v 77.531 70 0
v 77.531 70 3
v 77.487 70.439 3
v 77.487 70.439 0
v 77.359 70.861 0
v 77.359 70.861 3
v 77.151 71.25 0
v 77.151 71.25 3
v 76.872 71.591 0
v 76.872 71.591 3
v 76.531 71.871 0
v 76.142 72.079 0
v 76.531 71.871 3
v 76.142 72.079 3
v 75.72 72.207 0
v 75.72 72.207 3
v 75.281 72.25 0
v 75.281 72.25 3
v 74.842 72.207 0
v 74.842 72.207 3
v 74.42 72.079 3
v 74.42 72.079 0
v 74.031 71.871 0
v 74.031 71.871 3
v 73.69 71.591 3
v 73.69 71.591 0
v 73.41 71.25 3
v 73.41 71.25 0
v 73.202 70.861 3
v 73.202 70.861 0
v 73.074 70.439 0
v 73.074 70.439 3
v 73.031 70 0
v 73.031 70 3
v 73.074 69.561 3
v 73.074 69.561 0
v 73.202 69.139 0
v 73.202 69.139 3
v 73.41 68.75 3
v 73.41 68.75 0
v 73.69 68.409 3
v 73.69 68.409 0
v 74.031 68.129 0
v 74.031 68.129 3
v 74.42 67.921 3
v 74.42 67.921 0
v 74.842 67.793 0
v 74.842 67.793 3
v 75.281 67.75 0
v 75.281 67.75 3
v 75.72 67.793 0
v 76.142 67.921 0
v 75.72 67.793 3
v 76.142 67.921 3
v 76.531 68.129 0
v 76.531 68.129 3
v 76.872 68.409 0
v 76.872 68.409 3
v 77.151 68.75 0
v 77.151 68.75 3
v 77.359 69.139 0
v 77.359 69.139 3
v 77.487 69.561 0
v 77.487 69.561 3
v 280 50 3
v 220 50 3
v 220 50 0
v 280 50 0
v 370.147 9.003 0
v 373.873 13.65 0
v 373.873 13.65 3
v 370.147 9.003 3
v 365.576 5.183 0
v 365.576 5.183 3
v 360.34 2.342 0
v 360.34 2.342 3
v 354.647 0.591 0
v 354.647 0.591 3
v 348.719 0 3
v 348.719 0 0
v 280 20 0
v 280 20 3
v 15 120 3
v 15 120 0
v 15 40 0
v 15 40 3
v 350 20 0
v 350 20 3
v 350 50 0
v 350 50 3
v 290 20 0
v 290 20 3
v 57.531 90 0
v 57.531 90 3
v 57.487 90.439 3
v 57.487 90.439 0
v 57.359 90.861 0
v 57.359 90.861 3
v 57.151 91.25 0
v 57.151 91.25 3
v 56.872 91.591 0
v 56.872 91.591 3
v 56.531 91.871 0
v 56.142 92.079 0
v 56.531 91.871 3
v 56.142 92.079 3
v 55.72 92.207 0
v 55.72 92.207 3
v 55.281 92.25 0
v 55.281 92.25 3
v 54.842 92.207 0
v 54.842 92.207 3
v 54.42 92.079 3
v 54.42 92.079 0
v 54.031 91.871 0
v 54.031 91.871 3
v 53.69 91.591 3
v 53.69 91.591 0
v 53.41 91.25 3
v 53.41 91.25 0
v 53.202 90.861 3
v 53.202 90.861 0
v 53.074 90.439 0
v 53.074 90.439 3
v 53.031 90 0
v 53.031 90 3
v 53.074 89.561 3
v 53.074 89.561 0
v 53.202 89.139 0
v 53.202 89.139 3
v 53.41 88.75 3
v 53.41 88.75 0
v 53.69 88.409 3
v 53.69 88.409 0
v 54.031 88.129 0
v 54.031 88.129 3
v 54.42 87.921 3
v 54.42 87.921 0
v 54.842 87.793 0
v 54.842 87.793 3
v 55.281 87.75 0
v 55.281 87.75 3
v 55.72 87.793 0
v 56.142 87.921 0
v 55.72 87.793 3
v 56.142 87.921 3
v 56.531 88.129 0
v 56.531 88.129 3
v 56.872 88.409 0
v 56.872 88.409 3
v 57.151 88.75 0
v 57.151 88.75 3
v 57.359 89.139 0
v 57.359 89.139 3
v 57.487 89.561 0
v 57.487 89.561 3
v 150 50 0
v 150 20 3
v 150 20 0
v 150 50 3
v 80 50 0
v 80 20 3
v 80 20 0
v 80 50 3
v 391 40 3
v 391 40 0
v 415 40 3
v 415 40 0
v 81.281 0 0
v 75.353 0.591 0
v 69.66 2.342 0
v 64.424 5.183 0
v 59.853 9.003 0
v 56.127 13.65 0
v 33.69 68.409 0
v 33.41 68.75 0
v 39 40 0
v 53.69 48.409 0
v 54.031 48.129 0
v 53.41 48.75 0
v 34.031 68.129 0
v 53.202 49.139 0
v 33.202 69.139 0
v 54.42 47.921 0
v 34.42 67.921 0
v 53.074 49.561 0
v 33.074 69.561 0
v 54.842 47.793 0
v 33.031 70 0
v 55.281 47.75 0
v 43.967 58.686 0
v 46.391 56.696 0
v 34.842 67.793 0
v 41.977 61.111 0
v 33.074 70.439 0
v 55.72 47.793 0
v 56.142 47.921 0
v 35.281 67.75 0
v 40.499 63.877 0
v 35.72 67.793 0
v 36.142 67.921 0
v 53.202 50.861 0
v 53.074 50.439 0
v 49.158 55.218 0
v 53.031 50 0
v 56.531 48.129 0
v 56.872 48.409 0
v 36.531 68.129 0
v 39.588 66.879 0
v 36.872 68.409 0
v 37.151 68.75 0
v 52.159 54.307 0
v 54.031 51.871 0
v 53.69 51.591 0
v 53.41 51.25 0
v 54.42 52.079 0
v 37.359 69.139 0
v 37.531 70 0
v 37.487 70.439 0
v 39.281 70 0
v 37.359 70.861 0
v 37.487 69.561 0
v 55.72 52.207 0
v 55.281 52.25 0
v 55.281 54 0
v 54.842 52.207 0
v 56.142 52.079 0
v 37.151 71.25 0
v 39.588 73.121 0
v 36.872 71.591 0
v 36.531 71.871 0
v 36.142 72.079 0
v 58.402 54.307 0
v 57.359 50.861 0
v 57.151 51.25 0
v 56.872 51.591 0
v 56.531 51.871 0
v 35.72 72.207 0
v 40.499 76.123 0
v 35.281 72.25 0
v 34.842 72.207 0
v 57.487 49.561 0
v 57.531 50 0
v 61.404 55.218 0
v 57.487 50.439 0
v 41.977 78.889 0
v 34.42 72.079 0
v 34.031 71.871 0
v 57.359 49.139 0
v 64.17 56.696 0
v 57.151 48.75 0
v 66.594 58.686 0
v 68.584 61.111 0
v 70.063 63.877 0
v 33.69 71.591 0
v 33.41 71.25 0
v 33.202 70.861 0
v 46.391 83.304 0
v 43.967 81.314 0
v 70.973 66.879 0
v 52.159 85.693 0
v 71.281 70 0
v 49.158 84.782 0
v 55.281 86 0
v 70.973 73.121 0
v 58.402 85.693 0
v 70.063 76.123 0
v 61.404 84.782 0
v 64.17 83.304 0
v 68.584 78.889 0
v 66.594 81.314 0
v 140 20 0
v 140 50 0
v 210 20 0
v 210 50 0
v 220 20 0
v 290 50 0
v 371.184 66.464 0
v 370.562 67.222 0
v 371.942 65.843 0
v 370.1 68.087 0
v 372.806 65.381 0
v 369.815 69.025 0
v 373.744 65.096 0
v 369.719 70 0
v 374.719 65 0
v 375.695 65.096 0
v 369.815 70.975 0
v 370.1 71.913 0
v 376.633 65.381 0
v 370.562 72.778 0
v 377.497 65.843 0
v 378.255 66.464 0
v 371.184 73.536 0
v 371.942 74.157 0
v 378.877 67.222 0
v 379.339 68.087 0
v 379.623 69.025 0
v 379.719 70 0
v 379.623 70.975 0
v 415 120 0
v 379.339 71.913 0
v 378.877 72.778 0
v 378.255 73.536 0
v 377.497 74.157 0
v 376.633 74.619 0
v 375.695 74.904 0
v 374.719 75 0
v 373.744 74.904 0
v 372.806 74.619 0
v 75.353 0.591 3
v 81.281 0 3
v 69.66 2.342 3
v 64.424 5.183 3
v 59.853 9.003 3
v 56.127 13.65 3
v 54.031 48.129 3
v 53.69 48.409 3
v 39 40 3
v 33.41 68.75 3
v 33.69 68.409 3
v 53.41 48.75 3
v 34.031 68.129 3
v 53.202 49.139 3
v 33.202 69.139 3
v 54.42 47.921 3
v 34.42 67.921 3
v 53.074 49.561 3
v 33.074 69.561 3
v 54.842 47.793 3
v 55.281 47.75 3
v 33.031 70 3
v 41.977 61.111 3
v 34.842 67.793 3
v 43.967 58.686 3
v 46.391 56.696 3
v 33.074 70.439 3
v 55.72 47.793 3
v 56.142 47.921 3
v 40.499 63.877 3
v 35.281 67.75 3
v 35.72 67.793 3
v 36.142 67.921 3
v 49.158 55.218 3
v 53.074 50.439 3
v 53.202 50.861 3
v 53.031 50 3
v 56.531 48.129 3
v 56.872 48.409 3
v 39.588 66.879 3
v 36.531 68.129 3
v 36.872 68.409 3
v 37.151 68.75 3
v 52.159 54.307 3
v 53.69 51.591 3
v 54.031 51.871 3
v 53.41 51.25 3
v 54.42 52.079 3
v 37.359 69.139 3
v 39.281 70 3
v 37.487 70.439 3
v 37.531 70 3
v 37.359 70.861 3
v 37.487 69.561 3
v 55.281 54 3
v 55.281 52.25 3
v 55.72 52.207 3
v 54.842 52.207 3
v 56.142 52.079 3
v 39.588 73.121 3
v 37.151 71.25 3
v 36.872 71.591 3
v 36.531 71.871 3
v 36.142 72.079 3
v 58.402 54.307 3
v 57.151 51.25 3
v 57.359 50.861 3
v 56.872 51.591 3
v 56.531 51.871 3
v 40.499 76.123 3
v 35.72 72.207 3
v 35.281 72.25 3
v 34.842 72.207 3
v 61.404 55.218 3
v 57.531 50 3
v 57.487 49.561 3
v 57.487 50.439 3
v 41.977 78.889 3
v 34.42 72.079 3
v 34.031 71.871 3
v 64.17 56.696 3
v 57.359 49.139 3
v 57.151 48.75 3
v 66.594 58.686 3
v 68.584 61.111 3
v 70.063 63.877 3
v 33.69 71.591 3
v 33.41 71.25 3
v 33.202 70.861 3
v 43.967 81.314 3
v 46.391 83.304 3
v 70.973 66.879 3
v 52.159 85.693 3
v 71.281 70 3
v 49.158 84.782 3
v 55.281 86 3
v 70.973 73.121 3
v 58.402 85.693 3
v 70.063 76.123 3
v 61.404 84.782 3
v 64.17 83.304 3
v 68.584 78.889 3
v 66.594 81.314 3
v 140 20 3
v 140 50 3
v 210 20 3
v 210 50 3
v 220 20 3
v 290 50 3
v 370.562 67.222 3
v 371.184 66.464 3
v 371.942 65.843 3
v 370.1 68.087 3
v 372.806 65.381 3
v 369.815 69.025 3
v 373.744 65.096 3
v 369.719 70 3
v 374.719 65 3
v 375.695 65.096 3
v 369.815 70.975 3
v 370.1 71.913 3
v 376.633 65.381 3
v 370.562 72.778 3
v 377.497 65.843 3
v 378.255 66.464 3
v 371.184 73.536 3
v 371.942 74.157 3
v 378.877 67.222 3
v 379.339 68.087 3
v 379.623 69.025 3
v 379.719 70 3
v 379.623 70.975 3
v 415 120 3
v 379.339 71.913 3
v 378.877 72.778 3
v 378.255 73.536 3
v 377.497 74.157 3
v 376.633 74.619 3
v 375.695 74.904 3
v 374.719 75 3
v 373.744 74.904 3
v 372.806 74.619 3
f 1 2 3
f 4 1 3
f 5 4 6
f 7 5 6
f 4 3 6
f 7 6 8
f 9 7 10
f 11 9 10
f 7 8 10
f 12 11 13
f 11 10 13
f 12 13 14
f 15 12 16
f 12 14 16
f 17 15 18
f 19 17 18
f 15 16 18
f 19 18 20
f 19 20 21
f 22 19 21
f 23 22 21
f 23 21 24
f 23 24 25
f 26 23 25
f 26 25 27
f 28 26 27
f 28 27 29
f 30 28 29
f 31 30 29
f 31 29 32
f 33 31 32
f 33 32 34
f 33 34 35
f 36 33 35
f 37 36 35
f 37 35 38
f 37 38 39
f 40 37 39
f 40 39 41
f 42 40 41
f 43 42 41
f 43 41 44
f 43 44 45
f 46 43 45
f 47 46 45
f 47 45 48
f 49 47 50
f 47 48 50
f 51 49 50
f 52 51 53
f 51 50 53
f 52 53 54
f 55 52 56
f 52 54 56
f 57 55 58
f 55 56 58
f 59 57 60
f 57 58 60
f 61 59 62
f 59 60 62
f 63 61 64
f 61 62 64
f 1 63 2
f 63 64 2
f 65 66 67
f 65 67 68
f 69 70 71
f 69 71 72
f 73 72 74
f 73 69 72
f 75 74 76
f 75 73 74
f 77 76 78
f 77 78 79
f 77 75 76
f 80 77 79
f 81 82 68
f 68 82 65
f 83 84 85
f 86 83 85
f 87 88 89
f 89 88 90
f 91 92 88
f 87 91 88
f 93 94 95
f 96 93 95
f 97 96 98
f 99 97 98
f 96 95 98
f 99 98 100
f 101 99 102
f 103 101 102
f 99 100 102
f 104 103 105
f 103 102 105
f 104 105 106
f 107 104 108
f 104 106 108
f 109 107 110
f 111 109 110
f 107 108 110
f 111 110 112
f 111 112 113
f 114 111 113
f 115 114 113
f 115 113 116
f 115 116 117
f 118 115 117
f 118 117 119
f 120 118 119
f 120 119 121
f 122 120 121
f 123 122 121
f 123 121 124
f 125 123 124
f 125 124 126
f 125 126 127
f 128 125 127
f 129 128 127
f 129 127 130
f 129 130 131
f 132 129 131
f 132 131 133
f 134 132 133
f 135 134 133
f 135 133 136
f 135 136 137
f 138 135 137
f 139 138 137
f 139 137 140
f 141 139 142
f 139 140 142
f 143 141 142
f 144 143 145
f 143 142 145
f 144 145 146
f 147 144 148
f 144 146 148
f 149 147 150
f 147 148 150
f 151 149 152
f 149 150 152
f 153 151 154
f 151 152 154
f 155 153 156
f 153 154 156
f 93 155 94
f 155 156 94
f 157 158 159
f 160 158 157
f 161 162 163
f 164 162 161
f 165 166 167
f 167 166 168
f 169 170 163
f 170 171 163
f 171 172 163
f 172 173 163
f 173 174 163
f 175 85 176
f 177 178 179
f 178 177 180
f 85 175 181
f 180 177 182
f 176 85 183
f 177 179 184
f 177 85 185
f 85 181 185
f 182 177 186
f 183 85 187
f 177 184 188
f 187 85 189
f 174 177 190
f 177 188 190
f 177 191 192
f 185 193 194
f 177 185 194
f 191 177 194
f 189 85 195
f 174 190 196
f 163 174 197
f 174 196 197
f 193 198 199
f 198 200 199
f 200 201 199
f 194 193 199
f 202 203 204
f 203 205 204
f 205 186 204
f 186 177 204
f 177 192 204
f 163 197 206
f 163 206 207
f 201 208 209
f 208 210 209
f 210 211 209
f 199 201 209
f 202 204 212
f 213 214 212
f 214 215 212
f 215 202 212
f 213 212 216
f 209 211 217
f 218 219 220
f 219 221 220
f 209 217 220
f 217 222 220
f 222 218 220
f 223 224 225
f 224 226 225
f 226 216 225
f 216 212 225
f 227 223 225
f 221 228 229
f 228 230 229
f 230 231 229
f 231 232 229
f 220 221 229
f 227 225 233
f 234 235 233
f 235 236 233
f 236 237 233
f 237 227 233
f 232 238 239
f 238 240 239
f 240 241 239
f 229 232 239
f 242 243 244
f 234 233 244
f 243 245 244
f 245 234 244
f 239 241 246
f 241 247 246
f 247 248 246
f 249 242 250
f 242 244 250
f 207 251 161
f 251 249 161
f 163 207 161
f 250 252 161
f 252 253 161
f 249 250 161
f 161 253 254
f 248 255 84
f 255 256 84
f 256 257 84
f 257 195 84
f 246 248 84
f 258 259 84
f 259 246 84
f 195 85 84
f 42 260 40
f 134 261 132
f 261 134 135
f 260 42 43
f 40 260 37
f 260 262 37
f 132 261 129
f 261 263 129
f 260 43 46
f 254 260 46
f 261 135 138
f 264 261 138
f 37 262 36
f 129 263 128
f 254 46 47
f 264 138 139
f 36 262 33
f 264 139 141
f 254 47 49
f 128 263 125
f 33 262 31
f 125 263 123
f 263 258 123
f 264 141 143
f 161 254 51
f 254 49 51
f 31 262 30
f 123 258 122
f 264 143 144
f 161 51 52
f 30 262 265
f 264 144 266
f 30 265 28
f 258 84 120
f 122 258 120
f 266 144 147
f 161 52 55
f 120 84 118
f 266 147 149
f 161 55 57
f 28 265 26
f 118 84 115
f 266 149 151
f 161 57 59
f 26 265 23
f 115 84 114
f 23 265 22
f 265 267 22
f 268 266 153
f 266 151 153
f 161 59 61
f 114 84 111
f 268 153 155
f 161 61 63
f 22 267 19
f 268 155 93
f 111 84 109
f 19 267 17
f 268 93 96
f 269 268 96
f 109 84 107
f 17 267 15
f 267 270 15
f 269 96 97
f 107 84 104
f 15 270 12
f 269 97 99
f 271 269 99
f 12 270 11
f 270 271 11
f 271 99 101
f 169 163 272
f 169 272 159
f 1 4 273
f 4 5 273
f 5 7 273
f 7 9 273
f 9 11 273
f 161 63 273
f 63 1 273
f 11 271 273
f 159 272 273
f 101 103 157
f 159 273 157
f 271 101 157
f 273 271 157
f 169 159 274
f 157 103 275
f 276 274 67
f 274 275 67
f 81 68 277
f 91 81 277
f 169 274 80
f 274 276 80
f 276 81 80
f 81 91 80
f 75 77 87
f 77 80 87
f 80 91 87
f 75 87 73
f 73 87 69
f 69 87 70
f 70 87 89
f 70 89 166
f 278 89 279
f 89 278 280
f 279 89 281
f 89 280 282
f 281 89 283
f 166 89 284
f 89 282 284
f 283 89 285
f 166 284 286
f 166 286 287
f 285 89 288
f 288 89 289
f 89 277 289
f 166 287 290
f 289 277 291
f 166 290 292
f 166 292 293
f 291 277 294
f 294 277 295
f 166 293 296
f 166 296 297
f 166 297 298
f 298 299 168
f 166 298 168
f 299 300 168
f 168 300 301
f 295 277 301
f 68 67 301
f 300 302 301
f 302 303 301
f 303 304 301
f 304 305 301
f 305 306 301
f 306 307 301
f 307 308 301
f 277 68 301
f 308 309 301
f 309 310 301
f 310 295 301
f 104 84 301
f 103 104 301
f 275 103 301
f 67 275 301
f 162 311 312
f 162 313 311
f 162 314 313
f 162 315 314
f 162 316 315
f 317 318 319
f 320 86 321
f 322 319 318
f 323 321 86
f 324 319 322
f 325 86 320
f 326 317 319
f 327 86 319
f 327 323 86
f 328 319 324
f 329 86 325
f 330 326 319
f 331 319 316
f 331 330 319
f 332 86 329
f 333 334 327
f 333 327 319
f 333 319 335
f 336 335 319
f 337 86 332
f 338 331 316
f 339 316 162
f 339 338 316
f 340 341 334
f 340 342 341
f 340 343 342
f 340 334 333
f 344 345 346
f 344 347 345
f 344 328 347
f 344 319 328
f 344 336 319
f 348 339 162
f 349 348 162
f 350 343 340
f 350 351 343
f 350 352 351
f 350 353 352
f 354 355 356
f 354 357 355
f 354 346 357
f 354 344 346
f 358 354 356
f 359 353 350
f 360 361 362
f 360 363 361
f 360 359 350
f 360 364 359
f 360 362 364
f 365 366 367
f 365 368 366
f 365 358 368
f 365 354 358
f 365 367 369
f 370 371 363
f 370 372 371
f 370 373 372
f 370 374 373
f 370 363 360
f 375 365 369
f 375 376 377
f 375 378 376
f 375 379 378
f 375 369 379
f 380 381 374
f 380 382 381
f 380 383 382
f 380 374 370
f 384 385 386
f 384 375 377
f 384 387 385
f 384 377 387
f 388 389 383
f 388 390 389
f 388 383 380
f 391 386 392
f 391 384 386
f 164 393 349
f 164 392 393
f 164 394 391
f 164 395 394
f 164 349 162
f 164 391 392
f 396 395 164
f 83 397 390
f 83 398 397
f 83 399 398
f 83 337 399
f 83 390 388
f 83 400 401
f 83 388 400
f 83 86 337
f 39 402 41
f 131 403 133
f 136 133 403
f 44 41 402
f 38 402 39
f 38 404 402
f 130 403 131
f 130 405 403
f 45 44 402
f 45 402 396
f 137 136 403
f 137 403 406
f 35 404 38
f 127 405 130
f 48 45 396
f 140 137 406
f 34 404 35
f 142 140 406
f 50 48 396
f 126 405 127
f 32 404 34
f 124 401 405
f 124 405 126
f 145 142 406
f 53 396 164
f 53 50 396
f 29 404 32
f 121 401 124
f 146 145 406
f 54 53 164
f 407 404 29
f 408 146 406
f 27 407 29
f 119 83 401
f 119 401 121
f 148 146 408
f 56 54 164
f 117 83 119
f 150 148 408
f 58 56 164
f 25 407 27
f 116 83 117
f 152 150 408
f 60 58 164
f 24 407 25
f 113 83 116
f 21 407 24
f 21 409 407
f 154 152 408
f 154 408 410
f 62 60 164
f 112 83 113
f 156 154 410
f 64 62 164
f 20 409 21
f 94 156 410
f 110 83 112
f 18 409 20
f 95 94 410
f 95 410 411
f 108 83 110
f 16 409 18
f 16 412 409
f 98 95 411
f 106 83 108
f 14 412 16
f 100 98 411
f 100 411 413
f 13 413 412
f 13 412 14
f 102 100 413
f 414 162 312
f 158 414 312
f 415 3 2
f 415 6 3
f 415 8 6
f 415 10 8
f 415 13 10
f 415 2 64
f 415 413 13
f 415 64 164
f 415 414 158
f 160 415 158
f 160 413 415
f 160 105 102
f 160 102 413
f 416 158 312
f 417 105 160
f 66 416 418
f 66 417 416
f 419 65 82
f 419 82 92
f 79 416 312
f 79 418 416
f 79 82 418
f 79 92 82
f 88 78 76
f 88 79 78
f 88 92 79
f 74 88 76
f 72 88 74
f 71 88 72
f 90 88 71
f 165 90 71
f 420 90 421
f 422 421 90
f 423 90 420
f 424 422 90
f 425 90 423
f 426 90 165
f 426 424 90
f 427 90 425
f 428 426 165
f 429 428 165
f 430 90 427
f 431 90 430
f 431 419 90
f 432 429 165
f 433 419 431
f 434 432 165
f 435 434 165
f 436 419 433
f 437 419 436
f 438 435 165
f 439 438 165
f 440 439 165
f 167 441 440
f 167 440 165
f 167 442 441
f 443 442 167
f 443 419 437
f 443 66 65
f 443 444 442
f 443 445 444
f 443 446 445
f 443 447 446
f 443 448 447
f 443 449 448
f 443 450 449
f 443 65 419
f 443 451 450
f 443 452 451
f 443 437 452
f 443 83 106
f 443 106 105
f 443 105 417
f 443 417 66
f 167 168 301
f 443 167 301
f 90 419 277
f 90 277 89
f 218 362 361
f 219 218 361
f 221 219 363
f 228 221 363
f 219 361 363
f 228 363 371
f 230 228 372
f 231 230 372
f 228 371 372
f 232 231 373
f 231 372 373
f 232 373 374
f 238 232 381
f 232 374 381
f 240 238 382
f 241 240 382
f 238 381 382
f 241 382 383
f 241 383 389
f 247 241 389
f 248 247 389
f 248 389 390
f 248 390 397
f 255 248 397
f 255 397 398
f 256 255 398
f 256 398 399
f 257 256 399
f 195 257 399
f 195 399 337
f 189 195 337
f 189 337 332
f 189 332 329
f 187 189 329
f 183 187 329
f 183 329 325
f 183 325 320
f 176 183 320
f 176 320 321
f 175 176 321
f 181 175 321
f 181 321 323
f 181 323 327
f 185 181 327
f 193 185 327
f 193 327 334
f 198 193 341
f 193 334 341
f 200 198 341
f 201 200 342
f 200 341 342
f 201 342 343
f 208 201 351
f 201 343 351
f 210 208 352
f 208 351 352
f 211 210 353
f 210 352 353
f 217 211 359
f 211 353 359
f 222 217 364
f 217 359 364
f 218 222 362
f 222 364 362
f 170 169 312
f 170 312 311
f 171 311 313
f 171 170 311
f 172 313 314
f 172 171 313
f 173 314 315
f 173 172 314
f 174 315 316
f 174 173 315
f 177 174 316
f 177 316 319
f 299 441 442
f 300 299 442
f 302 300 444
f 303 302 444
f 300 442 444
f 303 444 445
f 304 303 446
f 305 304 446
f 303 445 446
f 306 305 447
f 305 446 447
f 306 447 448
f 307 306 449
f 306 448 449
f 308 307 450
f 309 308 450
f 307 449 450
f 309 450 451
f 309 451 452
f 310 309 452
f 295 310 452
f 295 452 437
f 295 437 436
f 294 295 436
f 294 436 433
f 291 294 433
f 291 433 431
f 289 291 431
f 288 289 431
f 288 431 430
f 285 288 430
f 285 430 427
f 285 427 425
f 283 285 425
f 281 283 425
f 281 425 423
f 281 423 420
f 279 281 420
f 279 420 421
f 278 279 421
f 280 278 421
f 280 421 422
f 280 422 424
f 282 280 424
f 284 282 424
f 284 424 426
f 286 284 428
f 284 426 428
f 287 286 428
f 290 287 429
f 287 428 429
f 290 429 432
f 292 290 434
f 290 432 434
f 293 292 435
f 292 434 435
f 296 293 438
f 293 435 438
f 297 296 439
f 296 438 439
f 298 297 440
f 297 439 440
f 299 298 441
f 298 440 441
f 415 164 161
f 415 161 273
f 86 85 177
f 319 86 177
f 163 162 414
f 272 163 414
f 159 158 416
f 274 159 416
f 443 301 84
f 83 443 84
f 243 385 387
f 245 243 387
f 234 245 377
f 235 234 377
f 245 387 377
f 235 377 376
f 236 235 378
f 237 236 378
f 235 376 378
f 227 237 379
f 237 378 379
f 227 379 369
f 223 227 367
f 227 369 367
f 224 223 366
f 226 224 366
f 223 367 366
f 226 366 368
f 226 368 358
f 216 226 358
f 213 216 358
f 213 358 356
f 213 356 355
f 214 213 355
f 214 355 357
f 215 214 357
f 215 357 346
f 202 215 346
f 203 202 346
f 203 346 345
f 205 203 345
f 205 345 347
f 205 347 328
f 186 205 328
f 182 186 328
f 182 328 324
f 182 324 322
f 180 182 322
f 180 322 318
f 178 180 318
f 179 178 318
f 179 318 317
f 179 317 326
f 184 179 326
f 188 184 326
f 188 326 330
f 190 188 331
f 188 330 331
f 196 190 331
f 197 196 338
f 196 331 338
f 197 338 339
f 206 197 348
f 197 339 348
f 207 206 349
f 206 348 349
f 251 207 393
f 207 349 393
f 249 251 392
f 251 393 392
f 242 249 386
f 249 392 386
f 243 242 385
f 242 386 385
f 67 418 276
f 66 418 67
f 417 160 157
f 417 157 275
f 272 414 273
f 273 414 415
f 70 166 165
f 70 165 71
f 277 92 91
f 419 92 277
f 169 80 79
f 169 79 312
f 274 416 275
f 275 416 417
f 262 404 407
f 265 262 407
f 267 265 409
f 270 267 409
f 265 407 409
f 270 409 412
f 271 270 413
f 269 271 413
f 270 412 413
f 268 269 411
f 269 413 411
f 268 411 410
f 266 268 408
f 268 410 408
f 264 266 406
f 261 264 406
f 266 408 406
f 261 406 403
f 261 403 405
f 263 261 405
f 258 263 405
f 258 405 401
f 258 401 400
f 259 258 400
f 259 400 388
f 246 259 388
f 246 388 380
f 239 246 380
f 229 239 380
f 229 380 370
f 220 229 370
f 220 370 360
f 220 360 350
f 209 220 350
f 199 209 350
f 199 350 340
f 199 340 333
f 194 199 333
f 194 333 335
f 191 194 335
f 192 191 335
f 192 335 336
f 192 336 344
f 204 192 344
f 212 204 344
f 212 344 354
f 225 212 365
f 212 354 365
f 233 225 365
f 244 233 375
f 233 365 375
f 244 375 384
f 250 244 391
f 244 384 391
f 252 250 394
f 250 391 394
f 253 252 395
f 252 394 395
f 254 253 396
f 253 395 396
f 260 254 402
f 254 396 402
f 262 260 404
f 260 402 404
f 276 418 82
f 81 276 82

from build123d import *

# Parameters (mm, degrees)
EXTRUDE_1_DEPTH     = 3
SKETCH_2_W          = 60
SKETCH_2_H          = 30
CUT_EXTRUDE_2_DEPTH = 417.901436616
SKETCH_3_R          = 16
SKETCH_3_R_2        = 2.25
SKETCH_3_R_3        = 5
CUT_EXTRUDE_3_DEPTH = 417.901436616
EXTRUDE_START       = -3
EXTRUDE_4_DEPTH     = 3


with BuildPart() as part:
    # 草圖1 → 伸長1 (new body)
    with BuildSketch(Plane.XY):
        with BuildLine():
            Line((55.280581326, 100), (374.719418674, 100))
            ThreePointArc((374.719418674, 100), (401.086913014, 84.309271198), (399.872727163, 53.650349482))
            Line((399.872727163, 53.650349482), (373.872727163, 13.650349482))
            ThreePointArc((373.872727163, 13.650349482), (363.028689873, 3.63250566), (348.719418674, 0))
            Line((348.719418674, 0), (81.280581326, 0))
            ThreePointArc((81.280581326, 0), (66.971310127, 3.63250566), (56.127272837, 13.650349482))
            Line((56.127272837, 13.650349482), (30.127272837, 53.650349482))
            ThreePointArc((30.127272837, 53.650349482), (28.913086986, 84.309271198), (55.280581326, 100))
        make_face()
    extrude(amount=EXTRUDE_1_DEPTH)

    # 草圖2 → 伸長2 (cut, through all)
    with BuildSketch(Plane.XY.offset(3)):
        with Locations((110, 35)):
            Rectangle(SKETCH_2_W, SKETCH_2_H)
        with Locations((180, 35)):
            Rectangle(SKETCH_2_W, SKETCH_2_H)
        with Locations((250, 35)):
            Rectangle(SKETCH_2_W, SKETCH_2_H)
        with Locations((320, 35)):
            Rectangle(SKETCH_2_W, SKETCH_2_H)
    extrude(amount=-CUT_EXTRUDE_2_DEPTH, mode=Mode.SUBTRACT)

    # 草圖3 → 伸長3 (cut, through all)
    with BuildSketch(Plane.XY.offset(3)):
        with Locations((55.280581326, 70)):
            Circle(SKETCH_3_R)
        with Locations((55.280581326, 90)):
            Circle(SKETCH_3_R_2)
        with Locations((75.280581326, 70)):
            Circle(SKETCH_3_R_2)
        with Locations((55.280581326, 50)):
            Circle(SKETCH_3_R_2)
        with Locations((35.280581326, 70)):
            Circle(SKETCH_3_R_2)
        with Locations((374.719418674, 70)):
            Circle(SKETCH_3_R_3)
    extrude(amount=-CUT_EXTRUDE_3_DEPTH, mode=Mode.SUBTRACT)

    # 草圖4 → 伸長4 (add)
    with BuildSketch(Plane.XY.offset(3).offset(EXTRUDE_START)):
        with BuildLine():
            Line((399.872727163, 53.650349482), (391, 40))
            Line((391, 40), (415, 40))
            Line((415, 40), (415, 120))
            Line((415, 120), (15, 120))
            Line((15, 120), (15, 40))
            Line((15, 40), (39, 40))
            Line((39, 40), (30.127272837, 53.650349482))
            ThreePointArc((30.127272837, 53.650349482), (28.913086986, 84.309271198), (55.280581326, 100))
            Line((55.280581326, 100), (374.719418674, 100))
            ThreePointArc((374.719418674, 100), (401.086913014, 84.309271198), (399.872727163, 53.650349482))
        make_face()
    extrude(amount=EXTRUDE_4_DEPTH)


solid = part.part
